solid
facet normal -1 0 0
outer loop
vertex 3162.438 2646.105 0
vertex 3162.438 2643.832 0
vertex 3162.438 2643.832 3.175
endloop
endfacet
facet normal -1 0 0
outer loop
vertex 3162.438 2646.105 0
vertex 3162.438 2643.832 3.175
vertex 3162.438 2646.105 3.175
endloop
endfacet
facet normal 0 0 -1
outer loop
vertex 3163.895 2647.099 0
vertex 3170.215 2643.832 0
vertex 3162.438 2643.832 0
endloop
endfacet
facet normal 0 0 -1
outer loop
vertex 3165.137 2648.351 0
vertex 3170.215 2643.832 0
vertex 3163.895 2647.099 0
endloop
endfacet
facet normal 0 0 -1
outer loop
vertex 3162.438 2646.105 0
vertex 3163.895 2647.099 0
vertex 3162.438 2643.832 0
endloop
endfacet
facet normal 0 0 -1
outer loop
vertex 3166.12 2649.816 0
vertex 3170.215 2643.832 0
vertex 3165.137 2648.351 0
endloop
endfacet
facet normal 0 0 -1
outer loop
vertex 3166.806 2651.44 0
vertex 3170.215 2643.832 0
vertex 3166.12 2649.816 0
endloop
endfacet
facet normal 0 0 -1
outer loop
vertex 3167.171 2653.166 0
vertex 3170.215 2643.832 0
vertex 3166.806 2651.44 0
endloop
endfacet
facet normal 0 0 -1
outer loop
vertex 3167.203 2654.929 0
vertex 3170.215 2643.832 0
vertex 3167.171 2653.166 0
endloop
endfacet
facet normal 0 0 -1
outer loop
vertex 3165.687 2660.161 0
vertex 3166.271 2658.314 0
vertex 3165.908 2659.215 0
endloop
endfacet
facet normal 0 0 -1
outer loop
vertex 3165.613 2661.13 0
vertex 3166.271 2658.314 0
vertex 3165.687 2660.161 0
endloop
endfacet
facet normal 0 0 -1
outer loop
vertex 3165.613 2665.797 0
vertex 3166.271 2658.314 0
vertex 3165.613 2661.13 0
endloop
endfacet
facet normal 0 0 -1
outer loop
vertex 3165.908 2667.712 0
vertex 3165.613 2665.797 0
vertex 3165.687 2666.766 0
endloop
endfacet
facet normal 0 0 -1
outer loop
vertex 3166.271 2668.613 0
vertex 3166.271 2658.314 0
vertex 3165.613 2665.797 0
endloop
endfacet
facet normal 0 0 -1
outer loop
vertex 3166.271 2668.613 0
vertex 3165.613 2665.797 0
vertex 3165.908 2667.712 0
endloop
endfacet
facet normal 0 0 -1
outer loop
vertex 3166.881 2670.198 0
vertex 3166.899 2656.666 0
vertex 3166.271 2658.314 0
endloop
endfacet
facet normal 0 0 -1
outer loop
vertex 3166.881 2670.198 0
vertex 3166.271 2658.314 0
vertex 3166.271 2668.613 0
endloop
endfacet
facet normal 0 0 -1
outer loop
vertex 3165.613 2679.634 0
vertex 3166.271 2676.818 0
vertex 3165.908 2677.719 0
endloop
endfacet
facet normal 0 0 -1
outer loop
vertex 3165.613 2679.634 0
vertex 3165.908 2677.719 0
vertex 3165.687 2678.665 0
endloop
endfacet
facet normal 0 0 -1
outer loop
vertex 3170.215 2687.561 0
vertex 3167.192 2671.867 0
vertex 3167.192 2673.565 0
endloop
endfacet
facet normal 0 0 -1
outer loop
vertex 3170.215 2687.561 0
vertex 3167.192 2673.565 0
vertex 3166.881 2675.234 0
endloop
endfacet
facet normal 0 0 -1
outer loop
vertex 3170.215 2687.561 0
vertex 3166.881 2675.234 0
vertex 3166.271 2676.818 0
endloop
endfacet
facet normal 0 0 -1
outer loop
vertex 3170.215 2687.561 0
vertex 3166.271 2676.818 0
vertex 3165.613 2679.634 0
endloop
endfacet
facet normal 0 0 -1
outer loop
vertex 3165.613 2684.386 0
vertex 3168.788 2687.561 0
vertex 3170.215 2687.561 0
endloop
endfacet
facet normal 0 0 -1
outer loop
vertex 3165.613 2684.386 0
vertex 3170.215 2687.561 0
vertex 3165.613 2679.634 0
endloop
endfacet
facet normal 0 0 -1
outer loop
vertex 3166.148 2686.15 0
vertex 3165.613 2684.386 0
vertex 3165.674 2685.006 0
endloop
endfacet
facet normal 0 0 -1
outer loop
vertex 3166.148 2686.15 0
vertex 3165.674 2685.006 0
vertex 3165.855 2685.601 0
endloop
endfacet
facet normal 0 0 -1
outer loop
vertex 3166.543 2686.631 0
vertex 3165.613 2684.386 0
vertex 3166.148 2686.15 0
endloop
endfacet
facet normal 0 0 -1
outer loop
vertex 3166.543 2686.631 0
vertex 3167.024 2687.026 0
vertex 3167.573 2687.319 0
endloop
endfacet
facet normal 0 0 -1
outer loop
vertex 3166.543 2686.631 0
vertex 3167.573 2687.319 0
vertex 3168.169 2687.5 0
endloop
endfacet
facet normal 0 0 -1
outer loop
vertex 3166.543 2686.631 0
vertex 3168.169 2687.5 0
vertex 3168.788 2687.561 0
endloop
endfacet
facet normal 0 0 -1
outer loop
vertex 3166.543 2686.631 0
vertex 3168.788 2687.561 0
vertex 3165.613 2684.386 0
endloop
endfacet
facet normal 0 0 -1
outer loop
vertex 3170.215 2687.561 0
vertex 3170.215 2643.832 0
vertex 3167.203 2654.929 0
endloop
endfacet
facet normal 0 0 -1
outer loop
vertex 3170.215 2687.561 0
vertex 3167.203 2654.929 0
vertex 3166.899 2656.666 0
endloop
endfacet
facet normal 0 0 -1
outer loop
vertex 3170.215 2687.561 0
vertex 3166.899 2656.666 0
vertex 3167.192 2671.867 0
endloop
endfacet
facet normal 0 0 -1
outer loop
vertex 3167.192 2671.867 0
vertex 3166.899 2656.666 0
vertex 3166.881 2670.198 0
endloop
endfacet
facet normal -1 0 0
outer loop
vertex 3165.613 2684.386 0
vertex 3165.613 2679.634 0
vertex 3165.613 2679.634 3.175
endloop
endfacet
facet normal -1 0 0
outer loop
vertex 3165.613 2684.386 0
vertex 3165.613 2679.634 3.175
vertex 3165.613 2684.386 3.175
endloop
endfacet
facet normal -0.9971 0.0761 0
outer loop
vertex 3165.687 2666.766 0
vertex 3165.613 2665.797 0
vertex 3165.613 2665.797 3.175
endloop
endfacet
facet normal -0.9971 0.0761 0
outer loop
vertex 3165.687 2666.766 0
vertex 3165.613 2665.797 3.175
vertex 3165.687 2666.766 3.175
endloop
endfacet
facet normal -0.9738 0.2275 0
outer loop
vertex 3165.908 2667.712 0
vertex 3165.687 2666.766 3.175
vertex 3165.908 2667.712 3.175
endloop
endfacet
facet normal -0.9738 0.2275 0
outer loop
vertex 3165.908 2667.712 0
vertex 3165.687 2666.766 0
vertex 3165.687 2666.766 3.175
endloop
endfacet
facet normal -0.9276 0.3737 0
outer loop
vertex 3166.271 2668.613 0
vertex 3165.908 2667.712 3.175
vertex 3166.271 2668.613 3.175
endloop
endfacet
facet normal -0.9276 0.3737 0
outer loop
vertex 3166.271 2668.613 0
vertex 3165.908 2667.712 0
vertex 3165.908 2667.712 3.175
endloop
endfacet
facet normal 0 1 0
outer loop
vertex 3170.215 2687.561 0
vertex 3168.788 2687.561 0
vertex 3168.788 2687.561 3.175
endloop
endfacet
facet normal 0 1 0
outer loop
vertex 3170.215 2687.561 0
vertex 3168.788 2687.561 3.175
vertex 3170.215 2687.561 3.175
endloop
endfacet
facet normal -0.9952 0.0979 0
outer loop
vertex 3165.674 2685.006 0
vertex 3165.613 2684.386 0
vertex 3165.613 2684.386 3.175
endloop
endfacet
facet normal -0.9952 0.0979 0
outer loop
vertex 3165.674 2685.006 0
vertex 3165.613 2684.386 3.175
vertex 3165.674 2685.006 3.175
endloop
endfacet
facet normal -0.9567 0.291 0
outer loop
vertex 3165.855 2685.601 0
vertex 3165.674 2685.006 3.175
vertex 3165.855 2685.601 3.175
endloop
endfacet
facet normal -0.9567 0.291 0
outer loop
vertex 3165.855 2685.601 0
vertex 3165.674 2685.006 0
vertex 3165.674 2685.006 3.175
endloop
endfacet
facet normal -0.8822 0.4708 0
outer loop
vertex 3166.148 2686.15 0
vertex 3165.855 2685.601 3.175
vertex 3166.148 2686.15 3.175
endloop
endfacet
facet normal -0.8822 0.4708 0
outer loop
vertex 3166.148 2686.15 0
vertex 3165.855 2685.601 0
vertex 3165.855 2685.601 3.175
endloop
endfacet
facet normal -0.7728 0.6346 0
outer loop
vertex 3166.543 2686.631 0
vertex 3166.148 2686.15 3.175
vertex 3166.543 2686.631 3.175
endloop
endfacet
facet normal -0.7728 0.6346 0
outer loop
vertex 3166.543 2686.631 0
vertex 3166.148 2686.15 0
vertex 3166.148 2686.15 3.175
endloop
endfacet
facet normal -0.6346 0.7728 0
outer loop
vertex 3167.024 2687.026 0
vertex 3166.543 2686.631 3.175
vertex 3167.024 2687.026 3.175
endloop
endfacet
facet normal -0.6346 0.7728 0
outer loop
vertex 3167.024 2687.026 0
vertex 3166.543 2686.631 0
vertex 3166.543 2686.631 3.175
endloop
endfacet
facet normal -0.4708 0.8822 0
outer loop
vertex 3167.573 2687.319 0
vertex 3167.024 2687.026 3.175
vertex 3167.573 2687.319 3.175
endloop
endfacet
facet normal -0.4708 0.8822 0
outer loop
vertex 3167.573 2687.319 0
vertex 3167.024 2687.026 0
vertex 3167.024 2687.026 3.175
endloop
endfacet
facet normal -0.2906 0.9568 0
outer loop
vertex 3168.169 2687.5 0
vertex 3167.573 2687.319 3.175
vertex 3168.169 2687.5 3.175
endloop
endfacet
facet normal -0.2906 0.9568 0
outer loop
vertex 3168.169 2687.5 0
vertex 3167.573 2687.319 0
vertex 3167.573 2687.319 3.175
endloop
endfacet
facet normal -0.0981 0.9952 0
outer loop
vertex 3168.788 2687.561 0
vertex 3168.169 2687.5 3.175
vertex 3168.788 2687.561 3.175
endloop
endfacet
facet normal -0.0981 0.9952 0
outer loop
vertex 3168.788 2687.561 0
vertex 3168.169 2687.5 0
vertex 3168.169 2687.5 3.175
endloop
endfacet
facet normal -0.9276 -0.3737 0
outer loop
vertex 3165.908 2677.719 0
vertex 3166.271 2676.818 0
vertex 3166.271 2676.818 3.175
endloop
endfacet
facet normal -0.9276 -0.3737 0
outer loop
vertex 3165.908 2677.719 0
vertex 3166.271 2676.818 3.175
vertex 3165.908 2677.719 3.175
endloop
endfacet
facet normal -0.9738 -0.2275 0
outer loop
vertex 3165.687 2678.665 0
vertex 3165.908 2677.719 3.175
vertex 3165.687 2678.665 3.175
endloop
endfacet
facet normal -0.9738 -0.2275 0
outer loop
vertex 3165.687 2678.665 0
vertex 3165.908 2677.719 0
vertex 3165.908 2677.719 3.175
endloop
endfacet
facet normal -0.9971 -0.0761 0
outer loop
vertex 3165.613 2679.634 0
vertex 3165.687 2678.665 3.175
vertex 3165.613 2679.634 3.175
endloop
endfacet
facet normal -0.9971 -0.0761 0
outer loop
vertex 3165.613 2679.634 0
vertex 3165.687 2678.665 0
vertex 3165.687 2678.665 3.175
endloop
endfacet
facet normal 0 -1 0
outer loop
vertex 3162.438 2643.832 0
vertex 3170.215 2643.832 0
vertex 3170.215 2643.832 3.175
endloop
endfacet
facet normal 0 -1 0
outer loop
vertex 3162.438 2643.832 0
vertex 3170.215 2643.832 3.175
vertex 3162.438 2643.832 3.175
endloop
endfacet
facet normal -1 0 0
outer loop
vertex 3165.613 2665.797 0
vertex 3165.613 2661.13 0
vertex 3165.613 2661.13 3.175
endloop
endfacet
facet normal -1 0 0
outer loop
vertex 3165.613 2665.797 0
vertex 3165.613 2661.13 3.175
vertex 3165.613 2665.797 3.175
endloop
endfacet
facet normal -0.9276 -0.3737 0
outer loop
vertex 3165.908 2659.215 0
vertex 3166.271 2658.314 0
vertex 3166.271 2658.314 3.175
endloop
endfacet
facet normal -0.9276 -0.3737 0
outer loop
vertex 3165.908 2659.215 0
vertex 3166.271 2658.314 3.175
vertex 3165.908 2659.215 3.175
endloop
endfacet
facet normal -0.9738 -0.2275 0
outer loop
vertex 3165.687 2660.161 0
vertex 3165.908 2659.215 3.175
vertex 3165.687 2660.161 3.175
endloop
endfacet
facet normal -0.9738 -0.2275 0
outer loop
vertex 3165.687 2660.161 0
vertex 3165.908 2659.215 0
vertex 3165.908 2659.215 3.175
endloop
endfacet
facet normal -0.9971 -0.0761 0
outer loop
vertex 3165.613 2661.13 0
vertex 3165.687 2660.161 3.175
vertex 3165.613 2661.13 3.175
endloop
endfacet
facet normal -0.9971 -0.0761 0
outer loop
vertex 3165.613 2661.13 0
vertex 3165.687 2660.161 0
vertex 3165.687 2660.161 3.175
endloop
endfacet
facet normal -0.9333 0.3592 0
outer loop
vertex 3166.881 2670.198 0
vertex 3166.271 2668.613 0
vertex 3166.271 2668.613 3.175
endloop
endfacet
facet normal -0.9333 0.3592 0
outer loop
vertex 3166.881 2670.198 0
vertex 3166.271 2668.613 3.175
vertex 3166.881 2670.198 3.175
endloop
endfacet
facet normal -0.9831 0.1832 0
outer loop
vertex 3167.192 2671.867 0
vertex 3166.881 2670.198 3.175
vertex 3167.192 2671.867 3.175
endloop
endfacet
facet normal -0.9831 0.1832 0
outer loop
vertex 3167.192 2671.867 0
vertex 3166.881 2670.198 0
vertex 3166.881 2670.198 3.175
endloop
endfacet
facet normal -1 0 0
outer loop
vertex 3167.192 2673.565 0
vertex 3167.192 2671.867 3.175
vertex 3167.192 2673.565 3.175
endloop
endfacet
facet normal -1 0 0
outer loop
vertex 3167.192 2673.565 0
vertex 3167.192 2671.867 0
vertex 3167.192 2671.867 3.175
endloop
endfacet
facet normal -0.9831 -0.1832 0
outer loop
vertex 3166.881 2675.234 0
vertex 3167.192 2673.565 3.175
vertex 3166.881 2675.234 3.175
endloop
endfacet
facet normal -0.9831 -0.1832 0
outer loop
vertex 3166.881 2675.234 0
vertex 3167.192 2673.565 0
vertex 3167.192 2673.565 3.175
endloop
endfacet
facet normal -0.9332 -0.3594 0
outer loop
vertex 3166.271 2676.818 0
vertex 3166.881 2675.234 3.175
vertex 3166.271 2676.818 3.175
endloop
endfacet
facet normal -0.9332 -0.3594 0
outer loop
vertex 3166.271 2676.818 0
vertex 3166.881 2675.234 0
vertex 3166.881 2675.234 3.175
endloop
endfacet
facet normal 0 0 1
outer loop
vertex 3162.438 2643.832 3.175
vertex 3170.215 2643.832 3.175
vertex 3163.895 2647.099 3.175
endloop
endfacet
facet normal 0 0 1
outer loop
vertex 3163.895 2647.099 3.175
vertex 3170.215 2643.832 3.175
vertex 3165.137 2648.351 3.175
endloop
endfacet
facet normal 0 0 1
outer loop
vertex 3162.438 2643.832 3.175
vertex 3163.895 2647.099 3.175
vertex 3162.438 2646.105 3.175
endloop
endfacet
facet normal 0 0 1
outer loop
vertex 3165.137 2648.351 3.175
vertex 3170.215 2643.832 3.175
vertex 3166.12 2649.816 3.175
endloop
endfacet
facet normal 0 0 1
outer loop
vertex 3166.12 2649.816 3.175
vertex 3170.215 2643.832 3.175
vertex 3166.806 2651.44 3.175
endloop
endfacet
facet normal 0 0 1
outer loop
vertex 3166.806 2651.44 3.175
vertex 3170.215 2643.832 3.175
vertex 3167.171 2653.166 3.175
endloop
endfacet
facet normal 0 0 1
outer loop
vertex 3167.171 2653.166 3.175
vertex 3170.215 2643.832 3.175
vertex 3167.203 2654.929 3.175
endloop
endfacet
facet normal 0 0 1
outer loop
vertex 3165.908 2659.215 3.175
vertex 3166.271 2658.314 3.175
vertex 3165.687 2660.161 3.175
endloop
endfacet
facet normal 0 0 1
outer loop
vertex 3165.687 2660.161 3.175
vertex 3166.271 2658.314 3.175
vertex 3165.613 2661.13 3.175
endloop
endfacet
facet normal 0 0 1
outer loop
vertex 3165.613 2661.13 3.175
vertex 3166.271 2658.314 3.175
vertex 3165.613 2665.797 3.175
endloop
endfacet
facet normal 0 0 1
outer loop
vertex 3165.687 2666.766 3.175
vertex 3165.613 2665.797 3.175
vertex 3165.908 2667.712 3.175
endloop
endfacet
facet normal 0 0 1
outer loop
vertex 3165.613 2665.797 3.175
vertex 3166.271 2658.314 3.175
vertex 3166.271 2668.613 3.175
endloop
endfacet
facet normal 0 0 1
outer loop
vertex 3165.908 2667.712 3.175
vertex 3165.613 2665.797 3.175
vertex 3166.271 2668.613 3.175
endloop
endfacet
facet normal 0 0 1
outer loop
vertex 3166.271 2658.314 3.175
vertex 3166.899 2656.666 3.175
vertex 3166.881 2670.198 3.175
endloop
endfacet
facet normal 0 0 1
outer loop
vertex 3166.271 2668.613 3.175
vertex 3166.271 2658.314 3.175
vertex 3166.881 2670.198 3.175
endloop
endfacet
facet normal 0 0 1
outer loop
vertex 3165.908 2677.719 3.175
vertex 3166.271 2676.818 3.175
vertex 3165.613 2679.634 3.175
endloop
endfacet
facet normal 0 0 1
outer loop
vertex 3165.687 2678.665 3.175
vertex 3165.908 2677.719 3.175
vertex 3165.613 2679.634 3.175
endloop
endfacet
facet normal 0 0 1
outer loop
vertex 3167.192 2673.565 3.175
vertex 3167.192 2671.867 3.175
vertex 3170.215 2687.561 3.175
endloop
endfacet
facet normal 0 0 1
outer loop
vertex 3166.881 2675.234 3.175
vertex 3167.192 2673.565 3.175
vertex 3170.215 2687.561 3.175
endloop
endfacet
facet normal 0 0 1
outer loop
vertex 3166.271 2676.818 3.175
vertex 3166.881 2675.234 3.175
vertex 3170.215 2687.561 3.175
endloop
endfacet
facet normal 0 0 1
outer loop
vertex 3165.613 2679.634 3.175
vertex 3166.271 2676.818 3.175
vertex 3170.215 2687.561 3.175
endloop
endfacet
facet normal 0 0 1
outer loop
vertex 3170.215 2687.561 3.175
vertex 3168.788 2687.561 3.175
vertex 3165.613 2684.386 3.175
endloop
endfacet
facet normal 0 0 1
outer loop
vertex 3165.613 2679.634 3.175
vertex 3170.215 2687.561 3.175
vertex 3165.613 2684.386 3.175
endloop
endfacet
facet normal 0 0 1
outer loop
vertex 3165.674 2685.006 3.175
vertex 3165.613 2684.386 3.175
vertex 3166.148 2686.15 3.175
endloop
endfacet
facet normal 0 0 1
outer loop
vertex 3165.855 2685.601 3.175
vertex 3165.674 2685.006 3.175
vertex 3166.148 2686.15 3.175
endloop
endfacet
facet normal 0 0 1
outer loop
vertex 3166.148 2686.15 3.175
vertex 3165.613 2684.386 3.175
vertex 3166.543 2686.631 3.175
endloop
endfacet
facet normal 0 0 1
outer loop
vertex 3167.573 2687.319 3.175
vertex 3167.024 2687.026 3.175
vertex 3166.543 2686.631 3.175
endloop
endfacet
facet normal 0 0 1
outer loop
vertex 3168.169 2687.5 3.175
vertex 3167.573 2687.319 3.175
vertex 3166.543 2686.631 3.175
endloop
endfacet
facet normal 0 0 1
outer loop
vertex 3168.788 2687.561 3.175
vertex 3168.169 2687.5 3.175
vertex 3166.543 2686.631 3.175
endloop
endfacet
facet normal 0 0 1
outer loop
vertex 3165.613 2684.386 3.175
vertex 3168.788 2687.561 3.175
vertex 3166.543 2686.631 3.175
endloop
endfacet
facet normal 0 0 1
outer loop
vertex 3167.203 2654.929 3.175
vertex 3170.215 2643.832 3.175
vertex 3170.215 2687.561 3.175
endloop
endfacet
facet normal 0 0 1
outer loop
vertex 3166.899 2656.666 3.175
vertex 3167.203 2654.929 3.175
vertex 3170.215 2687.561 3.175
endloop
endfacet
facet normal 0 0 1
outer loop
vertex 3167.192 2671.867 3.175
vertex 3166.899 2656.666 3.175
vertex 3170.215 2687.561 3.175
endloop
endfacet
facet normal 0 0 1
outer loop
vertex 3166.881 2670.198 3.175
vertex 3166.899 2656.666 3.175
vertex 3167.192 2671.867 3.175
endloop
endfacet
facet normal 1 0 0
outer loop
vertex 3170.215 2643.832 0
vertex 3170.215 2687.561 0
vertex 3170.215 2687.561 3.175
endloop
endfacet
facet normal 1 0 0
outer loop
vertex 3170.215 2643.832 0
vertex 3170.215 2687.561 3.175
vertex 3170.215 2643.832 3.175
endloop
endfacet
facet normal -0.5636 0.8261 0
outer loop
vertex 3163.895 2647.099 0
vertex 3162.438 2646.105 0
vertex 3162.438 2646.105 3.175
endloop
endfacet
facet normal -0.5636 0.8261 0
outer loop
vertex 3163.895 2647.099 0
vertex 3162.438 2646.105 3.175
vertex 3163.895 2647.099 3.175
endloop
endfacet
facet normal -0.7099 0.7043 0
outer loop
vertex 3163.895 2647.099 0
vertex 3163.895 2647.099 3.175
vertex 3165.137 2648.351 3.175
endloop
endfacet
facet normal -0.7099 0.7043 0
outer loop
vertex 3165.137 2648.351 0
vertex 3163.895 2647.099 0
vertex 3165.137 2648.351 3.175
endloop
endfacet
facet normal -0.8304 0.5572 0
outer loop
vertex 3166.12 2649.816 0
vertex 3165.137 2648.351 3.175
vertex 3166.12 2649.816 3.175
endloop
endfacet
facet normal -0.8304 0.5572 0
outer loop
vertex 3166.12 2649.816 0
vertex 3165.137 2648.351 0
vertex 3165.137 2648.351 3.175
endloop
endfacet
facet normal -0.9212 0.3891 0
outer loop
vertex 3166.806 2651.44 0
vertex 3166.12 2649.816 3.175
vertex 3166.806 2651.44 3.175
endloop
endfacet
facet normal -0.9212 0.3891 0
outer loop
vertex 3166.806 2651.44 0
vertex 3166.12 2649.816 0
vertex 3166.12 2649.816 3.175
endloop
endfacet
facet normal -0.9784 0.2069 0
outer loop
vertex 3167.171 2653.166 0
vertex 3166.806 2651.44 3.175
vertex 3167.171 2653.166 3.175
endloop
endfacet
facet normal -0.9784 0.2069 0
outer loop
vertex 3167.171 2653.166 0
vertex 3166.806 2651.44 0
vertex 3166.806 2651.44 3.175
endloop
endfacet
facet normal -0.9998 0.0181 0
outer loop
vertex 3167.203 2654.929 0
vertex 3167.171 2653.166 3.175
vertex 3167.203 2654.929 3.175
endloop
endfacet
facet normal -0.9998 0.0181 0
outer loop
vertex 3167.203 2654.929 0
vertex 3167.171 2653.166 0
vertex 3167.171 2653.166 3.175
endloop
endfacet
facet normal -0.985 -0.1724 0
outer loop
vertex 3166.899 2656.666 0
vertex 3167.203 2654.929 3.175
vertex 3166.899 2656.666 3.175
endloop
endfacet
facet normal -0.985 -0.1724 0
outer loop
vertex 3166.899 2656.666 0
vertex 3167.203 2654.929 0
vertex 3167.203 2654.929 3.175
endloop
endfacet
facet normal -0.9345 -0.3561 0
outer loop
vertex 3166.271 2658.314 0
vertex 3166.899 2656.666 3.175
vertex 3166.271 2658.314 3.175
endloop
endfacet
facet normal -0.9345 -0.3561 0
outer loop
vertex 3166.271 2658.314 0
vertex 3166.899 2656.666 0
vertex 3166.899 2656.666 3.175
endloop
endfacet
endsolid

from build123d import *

# Parameters (mm, degrees)
BOSS_EXTRUDE1_DEPTH = 3.175


with BuildPart() as part:
    # Sketch1 → Boss-Extrude1 (new body)
    with BuildSketch(Plane.XY):
        with BuildLine():
            Line((3170.215202539, 2687.561172968), (3170.215202539, 2643.831916187))
            Line((3170.215202539, 2643.831916187), (3162.437951858, 2643.831916187))
            Line((3162.437951858, 2643.831916187), (3162.437951858, 2646.105339002))
            ThreePointArc((3162.437951858, 2646.105339002), (3166.805815961, 2651.440206281), (3166.271377044, 2658.314318641))
            ThreePointArc((3166.271377044, 2658.314318641), (3165.779748802, 2659.68421749), (3165.612951858, 2661.130073625))
            Line((3165.612951858, 2661.130073625), (3165.612951858, 2665.797353633))
            ThreePointArc((3165.612951858, 2665.797353633), (3165.779748802, 2667.243209769), (3166.271377044, 2668.613108618))
            ThreePointArc((3166.271377044, 2668.613108618), (3167.230702539, 2672.715663629), (3166.271377044, 2676.818218641))
            ThreePointArc((3166.271377044, 2676.818218641), (3165.779748802, 2678.18811749), (3165.612951858, 2679.633973625))
            Line((3165.612951858, 2679.633973625), (3165.612951858, 2684.386172968))
            ThreePointArc((3165.612951858, 2684.386172968), (3166.542887828, 2686.631236998), (3168.787951858, 2687.561172968))
            Line((3168.787951858, 2687.561172968), (3170.215202539, 2687.561172968))
        make_face()
    extrude(amount=BOSS_EXTRUDE1_DEPTH)


solid = part.part
